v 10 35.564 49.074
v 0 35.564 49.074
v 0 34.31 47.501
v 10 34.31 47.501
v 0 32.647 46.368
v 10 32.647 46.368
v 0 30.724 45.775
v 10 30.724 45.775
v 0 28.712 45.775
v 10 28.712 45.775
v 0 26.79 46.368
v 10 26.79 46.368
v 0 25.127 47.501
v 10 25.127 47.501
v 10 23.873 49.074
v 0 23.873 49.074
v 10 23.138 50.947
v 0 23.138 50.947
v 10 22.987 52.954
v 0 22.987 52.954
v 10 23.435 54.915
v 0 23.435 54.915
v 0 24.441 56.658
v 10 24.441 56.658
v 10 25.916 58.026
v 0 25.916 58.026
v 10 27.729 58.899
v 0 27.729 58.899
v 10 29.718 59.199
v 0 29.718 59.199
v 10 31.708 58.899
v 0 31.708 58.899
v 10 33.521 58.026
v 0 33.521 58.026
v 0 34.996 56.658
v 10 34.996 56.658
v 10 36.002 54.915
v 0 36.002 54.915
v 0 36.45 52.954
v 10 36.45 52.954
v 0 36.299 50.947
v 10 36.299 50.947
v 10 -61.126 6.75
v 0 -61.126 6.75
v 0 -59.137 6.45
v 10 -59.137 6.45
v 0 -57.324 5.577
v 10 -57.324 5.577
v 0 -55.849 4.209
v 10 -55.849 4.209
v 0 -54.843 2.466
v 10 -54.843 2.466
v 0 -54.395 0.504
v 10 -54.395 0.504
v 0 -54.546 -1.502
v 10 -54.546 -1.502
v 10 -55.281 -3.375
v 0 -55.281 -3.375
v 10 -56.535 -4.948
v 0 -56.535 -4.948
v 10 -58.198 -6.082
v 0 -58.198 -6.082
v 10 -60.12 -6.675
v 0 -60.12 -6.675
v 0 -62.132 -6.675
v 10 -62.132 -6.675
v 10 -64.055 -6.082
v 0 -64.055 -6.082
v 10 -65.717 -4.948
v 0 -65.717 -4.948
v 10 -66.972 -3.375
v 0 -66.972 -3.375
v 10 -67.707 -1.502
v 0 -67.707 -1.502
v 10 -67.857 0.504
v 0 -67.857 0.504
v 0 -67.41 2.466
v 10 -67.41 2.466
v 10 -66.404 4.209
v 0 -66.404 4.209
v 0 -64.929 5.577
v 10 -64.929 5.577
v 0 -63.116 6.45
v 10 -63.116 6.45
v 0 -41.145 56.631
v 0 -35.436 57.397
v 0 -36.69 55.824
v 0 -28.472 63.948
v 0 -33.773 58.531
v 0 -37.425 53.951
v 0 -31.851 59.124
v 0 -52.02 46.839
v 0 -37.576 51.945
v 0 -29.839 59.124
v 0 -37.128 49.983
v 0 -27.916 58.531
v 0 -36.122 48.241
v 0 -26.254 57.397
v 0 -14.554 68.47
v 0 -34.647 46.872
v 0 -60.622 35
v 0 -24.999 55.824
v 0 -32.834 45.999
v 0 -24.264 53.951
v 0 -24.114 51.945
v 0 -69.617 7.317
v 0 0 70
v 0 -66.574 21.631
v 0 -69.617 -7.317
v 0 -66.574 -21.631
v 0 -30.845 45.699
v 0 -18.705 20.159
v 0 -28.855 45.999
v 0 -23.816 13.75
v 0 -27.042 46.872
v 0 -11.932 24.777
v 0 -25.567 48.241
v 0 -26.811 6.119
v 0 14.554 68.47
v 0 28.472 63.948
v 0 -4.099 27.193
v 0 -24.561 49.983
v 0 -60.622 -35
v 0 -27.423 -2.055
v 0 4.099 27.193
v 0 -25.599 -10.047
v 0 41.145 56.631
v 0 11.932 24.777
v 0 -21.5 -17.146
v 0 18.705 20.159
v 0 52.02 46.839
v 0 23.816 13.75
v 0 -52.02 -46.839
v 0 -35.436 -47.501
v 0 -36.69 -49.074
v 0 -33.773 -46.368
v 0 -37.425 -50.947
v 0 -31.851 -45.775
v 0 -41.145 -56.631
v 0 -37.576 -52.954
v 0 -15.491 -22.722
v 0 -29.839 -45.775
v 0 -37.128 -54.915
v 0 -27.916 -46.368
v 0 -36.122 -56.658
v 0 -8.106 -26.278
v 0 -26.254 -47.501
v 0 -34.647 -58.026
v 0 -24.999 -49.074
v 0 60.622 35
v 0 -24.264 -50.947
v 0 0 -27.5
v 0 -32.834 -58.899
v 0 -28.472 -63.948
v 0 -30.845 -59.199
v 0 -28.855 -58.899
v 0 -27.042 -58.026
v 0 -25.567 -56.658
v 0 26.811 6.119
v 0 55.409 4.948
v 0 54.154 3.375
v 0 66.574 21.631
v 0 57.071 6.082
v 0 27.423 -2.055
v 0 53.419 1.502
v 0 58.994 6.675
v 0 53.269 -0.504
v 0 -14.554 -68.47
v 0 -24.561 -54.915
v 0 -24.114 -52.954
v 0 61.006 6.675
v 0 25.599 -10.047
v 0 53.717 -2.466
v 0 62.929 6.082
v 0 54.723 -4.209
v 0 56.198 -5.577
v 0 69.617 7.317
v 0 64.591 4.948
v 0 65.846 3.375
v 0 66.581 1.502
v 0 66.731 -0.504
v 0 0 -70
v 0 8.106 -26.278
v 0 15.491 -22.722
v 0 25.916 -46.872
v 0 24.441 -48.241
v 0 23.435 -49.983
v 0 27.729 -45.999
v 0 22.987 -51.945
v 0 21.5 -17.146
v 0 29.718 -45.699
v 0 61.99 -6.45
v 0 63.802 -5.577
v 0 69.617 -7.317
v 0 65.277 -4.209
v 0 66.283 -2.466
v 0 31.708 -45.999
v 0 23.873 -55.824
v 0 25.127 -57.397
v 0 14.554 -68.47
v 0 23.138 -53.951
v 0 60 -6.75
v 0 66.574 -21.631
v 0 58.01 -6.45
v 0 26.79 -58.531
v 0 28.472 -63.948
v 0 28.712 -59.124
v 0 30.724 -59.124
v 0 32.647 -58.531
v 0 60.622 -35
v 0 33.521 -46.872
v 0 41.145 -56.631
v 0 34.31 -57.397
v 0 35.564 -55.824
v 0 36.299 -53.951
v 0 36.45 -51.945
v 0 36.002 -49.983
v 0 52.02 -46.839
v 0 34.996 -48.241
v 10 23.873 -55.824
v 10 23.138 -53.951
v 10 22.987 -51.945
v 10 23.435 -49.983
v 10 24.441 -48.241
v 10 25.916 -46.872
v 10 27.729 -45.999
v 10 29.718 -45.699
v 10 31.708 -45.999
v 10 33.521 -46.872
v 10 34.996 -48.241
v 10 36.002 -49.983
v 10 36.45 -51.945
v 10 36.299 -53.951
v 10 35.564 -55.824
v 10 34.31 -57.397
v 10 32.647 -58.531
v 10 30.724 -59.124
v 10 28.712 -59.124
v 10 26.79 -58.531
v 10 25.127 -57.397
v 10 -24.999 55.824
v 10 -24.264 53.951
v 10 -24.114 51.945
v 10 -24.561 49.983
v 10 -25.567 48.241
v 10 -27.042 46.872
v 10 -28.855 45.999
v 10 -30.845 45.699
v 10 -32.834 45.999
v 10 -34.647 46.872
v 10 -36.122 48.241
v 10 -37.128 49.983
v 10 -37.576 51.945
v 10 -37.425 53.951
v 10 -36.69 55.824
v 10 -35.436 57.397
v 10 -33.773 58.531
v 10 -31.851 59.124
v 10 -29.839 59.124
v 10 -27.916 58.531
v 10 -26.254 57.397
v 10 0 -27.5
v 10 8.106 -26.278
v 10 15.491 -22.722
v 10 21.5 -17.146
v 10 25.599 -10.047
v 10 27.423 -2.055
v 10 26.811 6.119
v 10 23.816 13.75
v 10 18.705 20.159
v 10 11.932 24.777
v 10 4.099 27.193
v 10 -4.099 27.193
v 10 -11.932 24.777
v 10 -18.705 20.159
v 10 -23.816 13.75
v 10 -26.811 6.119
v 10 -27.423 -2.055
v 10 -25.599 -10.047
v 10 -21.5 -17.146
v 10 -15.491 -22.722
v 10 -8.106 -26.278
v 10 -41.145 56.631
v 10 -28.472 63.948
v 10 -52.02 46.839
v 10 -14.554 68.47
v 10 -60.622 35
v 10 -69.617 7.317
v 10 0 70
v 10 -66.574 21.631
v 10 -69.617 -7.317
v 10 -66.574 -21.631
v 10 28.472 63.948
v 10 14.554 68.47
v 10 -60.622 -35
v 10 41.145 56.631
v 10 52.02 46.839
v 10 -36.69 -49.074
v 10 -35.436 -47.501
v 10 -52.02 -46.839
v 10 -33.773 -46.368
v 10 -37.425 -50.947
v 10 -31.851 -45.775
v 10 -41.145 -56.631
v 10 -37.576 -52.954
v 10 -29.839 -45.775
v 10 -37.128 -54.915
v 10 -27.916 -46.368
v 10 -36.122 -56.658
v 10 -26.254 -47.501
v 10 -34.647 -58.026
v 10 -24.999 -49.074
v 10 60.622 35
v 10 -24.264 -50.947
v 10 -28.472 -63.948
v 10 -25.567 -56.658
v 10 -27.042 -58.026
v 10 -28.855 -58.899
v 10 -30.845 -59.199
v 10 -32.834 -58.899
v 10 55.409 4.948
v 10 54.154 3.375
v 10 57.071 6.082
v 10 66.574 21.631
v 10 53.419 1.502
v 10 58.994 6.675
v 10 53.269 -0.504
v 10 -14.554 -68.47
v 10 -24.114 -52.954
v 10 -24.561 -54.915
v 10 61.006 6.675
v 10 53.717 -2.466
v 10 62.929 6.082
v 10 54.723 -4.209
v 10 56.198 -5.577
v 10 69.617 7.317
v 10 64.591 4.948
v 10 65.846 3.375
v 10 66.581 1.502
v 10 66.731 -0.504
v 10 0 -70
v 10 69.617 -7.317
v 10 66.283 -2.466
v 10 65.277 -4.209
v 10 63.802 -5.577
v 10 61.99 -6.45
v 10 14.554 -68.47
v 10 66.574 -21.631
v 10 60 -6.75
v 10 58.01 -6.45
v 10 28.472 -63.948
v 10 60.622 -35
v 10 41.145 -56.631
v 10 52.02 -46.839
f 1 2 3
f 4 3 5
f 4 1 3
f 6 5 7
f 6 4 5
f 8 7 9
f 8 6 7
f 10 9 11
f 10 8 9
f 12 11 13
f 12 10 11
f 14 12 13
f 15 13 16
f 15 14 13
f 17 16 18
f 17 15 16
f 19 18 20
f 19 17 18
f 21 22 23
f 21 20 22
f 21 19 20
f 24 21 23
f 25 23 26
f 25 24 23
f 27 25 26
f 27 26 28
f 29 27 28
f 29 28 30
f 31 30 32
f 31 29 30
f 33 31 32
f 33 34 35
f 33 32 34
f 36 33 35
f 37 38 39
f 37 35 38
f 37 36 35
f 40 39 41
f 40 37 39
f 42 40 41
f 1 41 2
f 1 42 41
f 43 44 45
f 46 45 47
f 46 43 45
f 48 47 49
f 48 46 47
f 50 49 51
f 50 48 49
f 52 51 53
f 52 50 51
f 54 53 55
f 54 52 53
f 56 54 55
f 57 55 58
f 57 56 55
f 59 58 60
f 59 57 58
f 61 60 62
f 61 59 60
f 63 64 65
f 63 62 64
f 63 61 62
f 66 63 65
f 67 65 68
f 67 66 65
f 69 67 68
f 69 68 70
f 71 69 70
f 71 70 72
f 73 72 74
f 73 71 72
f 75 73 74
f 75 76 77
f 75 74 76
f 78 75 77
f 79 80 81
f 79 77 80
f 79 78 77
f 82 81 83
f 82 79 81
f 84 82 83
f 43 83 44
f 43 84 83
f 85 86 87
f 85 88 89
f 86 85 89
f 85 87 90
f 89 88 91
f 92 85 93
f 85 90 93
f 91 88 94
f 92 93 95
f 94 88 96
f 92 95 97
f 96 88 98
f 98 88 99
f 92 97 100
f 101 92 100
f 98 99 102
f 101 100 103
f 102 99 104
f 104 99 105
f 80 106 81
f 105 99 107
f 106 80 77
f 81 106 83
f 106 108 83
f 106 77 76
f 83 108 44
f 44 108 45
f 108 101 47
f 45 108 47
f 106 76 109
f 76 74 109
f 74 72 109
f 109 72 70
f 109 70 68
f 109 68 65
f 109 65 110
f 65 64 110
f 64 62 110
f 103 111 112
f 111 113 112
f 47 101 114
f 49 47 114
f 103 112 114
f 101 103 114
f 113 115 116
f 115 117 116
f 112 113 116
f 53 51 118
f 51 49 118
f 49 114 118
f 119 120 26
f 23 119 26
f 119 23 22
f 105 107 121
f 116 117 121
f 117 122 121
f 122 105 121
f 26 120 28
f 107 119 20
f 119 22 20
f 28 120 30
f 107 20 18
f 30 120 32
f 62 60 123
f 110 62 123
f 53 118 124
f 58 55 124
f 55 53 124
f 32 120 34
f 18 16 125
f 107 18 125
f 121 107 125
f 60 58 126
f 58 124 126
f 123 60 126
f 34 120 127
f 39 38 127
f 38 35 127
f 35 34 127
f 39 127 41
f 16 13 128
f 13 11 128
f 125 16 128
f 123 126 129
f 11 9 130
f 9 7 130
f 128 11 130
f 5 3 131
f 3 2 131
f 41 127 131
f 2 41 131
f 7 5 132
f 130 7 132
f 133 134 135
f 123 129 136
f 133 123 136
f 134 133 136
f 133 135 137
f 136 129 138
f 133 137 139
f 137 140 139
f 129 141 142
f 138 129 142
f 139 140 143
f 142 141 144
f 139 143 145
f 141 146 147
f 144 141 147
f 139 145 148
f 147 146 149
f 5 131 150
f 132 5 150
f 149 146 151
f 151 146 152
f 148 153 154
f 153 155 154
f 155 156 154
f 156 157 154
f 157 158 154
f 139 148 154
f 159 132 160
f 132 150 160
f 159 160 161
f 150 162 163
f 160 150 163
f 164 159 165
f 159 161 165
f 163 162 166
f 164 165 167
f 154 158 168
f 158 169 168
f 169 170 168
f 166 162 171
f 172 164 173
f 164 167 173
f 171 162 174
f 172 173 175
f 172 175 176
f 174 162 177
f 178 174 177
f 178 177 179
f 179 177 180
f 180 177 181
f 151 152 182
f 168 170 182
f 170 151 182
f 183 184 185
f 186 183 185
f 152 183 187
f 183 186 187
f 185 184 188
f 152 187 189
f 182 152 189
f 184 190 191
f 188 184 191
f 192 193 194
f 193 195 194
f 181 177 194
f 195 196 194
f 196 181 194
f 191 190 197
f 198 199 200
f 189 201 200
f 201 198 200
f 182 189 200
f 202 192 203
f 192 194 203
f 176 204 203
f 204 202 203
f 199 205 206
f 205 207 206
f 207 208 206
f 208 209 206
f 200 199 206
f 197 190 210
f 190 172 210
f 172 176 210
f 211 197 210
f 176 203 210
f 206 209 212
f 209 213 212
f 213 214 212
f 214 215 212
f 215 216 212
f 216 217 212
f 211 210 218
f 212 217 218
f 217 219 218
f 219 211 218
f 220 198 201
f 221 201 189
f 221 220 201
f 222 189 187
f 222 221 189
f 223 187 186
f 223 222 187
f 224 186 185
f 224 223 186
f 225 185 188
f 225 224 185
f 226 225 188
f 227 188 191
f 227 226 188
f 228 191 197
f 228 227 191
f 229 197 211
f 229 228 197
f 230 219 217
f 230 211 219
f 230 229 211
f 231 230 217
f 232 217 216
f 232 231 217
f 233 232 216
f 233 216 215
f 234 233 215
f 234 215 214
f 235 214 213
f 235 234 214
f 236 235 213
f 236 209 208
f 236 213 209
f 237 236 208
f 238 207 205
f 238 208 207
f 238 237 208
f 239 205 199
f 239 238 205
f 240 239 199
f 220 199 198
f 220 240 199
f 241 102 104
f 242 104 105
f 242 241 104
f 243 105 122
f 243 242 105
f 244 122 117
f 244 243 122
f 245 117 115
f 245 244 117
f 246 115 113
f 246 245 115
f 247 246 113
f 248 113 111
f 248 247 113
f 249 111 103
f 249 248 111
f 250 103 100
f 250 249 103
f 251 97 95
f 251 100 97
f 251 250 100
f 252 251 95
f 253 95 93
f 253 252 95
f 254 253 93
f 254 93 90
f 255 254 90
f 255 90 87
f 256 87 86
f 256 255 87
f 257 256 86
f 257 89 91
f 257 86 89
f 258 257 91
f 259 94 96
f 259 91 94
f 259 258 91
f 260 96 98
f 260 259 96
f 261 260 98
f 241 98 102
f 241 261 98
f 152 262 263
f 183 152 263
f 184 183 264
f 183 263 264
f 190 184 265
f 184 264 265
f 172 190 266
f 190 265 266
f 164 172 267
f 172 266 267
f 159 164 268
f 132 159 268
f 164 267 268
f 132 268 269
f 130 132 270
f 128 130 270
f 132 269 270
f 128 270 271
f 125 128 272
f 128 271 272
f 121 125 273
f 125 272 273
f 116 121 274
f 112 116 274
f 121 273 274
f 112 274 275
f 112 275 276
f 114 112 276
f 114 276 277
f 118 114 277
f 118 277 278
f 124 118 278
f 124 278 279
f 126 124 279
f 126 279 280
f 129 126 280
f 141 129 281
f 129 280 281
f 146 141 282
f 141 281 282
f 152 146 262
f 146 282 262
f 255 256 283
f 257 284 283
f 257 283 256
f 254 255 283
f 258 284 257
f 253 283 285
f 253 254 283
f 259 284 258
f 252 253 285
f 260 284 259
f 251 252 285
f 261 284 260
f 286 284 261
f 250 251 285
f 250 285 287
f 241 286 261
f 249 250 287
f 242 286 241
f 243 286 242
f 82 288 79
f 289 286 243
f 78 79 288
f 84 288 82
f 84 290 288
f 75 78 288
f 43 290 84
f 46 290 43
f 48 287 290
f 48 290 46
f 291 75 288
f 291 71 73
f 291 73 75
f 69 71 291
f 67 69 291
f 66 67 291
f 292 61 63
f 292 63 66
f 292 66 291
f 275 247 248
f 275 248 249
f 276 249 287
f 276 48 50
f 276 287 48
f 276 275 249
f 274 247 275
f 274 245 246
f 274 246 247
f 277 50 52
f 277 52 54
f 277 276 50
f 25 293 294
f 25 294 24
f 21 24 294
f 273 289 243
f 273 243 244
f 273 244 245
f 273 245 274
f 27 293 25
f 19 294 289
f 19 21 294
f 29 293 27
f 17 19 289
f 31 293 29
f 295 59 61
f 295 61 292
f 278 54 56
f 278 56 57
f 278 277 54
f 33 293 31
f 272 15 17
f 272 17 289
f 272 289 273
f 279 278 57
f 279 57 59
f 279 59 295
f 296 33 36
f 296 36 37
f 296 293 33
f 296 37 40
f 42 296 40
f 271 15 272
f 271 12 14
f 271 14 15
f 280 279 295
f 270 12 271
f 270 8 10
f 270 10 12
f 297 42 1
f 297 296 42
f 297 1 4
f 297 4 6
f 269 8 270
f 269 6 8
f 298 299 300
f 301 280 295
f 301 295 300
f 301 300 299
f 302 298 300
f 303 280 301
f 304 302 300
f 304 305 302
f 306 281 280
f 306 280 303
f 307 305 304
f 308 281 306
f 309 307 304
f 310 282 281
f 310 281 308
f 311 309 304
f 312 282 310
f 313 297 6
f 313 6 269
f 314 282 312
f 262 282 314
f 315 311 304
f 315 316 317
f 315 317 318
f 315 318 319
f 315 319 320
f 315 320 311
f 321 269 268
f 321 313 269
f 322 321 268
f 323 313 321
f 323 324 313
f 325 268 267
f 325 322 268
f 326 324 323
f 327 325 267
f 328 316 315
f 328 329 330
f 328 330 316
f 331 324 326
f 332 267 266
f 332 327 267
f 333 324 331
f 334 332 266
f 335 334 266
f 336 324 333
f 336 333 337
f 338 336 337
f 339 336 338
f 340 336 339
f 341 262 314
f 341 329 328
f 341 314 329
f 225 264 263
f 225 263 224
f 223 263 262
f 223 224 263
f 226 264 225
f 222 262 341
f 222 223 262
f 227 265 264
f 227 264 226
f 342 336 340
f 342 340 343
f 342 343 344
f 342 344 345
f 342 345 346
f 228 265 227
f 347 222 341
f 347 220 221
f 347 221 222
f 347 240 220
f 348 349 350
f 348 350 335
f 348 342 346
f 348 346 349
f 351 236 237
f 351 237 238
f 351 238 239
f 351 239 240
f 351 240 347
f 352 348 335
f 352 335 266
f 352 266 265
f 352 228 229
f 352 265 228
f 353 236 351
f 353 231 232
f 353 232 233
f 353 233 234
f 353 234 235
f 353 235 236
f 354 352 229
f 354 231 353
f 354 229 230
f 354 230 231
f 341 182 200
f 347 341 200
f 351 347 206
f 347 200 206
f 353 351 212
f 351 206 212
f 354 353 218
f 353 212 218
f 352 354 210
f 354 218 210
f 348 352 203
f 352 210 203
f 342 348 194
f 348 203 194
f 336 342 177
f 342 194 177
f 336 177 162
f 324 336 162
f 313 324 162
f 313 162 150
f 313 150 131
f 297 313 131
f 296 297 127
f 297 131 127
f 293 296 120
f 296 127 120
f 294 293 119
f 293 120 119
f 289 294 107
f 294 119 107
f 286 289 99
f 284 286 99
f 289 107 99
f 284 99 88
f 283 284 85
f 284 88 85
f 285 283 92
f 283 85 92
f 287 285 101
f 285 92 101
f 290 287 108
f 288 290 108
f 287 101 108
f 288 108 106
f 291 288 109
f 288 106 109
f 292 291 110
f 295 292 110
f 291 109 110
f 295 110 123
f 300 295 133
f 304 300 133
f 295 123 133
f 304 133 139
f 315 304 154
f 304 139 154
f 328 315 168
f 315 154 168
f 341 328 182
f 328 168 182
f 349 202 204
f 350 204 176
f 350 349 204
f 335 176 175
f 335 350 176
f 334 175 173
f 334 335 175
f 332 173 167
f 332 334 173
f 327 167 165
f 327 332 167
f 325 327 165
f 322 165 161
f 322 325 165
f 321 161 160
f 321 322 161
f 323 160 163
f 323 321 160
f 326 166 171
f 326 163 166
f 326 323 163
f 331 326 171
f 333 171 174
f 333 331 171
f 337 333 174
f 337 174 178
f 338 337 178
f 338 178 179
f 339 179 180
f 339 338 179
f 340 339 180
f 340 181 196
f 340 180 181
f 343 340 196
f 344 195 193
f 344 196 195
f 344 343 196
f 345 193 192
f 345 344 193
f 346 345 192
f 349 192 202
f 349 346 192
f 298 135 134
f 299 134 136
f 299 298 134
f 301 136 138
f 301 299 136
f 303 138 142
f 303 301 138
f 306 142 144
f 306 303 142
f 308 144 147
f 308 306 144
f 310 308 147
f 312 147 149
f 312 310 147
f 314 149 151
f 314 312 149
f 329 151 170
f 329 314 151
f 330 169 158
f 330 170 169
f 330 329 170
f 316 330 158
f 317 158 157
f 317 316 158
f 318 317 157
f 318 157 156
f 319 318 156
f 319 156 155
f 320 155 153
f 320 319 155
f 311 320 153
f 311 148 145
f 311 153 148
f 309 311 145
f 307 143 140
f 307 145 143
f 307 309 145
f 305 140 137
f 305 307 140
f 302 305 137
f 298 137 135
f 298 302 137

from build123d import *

# Parameters (mm, degrees)
CROQUIS1_R              = 70
SALIENTE_EXTRUIR1_DEPTH = 10
MATRIZC5_COUNT          = 6
CROQUIS9_R              = 27.5
CORTAR_EXTRUIR1_DEPTH   = 10


with BuildPart() as part:
    # Croquis1 → Saliente-Extruir1 (new body)
    with BuildSketch(Plane(origin=(0, 0, 0), x_dir=(0, 0, -1), z_dir=(1, 0, 0))):
        Circle(CROQUIS1_R)
    extrude(amount=SALIENTE_EXTRUIR1_DEPTH)

    # Croquis8 → Taladro de margen para M122 (revolve, cut)
    with BuildSketch(Plane(origin=(10, 60, 0), x_dir=(0, 0, -1), z_dir=(0, 1, 0))):
        Polygon((0, 0), (0, 47.555809178), (6.75, 43.5), (6.75, 0), align=None)
    taladro_de_margen_para_m122 = revolve(axis=Axis((16.35, 60, 0), (-1, 0, 0)), mode=Mode.SUBTRACT)

    # MatrizC5: Taladro de margen para M122 ×6 about axis
    matrizc5_axis = Axis((0, -0.563144546, 0), (1, 0, 0))
    for i in range(1, MATRIZC5_COUNT):
        add(taladro_de_margen_para_m122.rotate(matrizc5_axis, i * 360 / MATRIZC5_COUNT), mode=Mode.SUBTRACT)

    # Croquis9 → Cortar-Extruir1 (cut)
    with BuildSketch(Plane(origin=(10, 0, 0), x_dir=(0, 0, -1), z_dir=(1, 0, 0))):
        Circle(CROQUIS9_R)
    extrude(amount=-CORTAR_EXTRUIR1_DEPTH, mode=Mode.SUBTRACT)


solid = part.part
